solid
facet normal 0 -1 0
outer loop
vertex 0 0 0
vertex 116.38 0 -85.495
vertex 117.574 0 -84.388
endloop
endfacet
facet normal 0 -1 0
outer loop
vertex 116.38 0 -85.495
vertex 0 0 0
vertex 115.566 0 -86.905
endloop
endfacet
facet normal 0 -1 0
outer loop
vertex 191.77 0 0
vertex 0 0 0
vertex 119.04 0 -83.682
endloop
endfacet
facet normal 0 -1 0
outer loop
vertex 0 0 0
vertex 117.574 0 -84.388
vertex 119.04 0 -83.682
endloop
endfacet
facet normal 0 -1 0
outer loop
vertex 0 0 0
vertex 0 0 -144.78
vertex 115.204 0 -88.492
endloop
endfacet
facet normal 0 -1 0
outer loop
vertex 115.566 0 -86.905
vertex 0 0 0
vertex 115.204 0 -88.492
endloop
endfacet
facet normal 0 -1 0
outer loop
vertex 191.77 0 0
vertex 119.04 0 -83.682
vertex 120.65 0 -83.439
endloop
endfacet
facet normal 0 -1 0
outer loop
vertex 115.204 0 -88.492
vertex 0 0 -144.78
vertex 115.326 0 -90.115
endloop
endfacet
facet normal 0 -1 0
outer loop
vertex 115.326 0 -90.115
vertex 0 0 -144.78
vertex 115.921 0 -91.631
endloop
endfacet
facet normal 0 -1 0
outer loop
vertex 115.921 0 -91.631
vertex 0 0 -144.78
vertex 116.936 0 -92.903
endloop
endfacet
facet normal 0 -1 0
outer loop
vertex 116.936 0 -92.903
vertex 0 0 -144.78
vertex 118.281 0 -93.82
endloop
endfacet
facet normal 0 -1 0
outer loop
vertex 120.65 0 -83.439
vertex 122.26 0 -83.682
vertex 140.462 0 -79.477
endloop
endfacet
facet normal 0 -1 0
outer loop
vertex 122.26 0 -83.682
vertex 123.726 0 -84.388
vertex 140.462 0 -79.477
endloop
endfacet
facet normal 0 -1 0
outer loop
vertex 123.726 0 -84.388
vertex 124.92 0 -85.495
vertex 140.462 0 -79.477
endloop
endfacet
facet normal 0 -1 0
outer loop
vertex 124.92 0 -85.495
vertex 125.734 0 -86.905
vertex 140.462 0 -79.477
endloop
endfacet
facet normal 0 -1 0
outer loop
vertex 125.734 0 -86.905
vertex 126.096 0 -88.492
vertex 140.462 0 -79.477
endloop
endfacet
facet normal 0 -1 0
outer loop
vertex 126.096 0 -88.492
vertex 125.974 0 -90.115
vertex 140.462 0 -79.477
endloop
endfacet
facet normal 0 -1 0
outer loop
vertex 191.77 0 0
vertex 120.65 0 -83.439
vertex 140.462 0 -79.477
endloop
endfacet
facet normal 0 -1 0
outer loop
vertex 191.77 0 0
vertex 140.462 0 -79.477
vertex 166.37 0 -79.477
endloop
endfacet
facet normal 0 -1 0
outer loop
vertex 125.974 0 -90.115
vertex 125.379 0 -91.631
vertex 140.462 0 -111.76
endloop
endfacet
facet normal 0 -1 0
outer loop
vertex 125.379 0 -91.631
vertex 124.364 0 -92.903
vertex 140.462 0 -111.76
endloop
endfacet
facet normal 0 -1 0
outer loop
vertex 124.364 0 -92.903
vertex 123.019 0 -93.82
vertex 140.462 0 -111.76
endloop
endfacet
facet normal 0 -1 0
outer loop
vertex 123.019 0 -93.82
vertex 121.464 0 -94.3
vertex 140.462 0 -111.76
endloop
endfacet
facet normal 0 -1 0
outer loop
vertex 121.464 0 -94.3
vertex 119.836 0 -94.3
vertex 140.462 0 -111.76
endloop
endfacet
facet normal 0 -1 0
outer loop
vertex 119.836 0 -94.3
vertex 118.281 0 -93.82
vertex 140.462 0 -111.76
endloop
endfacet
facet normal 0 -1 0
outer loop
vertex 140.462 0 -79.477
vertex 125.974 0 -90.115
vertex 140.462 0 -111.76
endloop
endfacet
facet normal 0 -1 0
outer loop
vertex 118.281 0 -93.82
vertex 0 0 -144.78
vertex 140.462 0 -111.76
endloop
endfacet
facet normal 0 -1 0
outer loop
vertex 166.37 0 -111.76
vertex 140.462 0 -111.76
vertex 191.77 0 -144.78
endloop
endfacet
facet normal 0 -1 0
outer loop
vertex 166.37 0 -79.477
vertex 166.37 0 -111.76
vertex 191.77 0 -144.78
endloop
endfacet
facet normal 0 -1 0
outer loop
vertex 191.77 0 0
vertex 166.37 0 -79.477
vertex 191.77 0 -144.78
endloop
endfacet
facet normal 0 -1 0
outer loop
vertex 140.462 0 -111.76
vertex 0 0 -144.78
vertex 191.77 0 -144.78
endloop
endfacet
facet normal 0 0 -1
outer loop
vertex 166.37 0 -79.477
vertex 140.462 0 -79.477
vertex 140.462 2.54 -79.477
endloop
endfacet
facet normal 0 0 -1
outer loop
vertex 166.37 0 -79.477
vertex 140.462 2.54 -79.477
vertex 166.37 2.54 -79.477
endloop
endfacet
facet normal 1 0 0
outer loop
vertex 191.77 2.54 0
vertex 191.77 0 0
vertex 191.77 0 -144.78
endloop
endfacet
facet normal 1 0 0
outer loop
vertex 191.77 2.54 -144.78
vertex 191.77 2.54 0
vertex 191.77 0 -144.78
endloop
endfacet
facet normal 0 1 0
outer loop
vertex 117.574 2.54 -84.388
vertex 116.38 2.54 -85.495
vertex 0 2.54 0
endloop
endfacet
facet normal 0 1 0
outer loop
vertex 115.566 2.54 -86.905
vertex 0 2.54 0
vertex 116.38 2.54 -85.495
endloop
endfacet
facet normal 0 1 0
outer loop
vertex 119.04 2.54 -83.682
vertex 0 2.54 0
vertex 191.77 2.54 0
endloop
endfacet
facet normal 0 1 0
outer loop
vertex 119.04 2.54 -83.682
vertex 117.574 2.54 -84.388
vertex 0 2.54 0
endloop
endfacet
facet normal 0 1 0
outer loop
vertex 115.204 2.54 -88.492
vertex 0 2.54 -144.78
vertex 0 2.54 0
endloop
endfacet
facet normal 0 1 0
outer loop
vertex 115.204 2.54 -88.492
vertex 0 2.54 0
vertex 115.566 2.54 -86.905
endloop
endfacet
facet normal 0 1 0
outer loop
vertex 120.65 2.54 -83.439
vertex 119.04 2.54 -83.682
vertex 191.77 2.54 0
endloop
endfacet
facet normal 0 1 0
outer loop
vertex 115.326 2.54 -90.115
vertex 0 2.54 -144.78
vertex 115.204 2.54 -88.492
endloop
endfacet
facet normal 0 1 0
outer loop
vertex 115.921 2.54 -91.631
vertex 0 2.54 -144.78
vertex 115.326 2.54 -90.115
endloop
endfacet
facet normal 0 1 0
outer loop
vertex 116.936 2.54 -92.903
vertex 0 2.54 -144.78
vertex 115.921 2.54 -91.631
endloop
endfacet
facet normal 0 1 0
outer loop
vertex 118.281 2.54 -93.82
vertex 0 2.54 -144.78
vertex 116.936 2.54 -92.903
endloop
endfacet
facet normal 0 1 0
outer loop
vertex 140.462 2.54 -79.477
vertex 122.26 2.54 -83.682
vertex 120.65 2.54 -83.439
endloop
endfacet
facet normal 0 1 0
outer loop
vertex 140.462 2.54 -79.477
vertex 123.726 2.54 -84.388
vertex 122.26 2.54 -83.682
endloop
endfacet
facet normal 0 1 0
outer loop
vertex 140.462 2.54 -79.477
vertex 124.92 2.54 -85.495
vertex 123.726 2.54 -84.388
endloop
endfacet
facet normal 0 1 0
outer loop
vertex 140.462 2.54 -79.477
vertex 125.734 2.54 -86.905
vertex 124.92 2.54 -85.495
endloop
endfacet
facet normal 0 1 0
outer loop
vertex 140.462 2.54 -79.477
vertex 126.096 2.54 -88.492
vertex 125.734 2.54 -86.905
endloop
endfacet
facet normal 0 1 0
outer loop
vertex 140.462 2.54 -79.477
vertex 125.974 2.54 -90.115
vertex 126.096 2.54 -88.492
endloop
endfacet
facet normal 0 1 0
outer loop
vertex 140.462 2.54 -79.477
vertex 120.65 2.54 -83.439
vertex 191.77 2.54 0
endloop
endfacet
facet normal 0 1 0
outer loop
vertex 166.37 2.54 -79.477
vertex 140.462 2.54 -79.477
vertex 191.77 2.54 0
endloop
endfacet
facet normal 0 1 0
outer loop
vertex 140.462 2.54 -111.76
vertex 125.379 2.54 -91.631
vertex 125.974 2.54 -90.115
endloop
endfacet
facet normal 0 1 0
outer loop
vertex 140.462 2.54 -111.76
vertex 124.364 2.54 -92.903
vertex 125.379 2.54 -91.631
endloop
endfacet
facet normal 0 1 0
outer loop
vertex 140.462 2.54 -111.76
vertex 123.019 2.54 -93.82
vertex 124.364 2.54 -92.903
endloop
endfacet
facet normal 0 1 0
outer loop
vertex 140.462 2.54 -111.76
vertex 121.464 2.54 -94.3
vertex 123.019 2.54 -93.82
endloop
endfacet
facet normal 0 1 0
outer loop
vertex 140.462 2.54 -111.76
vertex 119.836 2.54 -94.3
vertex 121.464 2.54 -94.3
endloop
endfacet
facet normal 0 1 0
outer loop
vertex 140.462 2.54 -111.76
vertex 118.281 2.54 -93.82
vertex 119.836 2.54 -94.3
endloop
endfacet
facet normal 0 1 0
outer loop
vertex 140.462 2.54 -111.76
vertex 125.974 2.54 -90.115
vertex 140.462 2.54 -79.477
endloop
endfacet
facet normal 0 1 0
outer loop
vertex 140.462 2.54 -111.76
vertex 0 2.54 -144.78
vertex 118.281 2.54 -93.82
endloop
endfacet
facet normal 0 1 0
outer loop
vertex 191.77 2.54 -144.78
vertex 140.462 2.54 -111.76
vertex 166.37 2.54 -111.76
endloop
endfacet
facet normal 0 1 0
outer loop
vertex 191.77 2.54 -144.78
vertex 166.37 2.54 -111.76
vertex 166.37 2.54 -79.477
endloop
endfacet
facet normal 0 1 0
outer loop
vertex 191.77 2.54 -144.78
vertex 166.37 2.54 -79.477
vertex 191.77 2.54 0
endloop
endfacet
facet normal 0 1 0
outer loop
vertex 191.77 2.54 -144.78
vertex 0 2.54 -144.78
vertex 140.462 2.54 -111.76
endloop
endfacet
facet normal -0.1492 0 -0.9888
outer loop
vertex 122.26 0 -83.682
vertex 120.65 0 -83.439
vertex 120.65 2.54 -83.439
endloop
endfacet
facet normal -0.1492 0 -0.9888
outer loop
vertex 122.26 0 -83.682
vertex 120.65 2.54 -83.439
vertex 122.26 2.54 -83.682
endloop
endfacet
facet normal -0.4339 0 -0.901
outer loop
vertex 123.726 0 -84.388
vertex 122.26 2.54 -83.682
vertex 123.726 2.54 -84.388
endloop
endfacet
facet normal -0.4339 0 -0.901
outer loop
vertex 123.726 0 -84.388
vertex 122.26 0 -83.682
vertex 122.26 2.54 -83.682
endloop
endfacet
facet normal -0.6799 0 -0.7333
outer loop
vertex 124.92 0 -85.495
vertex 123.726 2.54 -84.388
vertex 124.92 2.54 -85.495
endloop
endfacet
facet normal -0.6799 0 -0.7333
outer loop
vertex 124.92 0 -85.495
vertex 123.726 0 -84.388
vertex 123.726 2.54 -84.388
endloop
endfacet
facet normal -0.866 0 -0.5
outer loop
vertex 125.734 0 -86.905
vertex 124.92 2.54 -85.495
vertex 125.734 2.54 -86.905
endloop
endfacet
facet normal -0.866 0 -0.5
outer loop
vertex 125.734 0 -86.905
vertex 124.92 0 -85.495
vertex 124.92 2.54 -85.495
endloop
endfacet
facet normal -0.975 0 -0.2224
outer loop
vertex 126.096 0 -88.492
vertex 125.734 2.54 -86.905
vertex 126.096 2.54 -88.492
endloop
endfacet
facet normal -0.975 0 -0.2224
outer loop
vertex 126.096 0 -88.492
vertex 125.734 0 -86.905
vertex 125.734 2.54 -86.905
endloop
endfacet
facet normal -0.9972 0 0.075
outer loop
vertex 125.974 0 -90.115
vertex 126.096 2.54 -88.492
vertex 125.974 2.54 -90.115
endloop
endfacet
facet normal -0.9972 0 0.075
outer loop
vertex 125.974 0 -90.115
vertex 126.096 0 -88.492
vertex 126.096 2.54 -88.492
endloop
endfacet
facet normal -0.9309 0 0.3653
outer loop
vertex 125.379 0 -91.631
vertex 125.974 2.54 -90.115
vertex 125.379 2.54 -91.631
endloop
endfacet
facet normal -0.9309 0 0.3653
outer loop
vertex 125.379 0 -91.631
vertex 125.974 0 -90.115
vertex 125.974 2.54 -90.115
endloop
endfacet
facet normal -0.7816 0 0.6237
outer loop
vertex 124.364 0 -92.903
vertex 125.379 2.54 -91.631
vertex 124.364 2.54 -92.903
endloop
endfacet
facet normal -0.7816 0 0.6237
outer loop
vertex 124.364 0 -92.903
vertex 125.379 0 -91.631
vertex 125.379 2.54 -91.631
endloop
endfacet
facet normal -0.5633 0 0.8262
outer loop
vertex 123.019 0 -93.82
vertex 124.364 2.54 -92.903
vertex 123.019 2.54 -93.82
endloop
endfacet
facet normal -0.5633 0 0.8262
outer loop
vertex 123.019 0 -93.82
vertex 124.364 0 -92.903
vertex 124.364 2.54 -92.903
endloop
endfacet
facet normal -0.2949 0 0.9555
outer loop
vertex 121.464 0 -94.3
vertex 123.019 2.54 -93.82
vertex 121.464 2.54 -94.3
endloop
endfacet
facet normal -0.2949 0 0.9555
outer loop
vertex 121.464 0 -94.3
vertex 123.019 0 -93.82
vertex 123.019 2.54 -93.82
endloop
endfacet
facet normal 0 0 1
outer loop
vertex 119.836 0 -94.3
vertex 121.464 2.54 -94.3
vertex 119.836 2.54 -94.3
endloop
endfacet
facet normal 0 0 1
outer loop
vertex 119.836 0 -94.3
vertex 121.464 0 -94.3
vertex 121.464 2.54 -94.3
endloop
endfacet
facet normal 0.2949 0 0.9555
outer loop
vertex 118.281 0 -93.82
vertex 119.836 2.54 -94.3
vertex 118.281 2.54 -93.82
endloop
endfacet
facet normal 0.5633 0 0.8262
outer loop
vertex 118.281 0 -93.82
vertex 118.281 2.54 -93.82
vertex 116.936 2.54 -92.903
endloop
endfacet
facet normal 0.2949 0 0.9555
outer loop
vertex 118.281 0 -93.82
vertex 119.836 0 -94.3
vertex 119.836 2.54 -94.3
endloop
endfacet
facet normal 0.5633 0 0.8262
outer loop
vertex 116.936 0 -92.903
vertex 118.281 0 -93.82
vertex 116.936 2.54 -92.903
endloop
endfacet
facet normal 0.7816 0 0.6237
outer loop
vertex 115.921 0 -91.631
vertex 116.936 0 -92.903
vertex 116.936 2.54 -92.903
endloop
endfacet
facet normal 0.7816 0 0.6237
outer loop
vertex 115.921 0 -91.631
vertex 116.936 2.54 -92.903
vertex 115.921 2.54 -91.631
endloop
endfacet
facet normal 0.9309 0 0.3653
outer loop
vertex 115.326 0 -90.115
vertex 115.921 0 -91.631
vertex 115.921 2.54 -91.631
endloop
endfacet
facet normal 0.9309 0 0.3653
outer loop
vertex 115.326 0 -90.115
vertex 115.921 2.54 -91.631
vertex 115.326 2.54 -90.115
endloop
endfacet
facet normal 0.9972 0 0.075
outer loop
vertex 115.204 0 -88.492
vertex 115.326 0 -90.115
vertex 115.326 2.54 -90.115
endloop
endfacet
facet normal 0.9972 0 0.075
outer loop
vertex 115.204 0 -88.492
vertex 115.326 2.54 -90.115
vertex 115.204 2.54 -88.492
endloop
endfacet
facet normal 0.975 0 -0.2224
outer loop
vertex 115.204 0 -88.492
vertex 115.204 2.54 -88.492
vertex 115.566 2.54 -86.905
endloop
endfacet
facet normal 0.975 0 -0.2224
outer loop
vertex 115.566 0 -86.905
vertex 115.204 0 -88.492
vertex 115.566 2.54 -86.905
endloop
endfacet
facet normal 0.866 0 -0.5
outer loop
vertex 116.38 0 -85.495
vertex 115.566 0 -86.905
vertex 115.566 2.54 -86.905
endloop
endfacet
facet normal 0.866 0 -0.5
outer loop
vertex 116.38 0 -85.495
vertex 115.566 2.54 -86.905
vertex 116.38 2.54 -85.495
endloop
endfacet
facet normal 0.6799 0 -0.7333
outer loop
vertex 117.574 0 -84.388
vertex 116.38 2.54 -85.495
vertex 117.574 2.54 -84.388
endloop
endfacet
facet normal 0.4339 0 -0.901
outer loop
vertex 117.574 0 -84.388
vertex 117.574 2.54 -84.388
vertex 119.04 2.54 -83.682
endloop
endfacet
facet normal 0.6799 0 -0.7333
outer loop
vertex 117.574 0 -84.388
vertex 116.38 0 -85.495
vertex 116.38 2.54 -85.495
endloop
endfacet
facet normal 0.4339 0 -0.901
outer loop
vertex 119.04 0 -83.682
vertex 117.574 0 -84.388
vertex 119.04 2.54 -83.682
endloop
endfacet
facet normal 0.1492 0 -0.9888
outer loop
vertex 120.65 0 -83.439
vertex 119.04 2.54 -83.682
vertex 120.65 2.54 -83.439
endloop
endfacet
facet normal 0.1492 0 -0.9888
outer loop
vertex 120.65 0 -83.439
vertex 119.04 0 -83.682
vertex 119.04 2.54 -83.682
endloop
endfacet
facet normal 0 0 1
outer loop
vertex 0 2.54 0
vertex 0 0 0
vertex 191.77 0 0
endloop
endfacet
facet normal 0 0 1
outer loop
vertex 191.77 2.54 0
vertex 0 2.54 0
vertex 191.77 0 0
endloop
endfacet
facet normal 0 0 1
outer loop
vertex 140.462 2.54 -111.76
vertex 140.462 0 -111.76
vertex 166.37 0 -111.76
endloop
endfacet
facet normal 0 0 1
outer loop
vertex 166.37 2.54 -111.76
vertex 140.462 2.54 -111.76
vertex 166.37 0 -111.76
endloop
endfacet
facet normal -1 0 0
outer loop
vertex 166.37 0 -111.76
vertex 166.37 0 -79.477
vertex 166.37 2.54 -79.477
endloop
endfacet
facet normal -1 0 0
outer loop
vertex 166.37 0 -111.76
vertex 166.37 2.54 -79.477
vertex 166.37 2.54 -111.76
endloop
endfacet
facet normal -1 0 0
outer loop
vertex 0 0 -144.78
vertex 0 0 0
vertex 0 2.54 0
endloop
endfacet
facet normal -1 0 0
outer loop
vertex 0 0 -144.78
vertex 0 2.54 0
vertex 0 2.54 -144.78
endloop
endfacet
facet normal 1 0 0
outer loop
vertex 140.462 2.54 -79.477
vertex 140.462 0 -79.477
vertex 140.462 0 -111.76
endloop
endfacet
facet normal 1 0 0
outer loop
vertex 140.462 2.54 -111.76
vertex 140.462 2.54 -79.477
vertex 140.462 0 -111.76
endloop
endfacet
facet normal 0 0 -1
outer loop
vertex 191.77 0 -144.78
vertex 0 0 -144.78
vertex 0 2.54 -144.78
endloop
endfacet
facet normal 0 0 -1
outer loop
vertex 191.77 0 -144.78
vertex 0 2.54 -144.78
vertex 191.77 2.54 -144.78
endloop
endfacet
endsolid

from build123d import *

# Parameters (mm, degrees)
SKETCH1_W           = 191.77
SKETCH1_H           = 144.78
SKETCH1_R           = 5.461
SKETCH1_W_2         = 25.908
SKETCH1_H_2         = 32.2834
BOSS_EXTRUDE1_DEPTH = 2.54


with BuildPart() as part:
    # Sketch1 → Boss-Extrude1 (new body)
    with BuildSketch(Plane(origin=(0, 0, 0), x_dir=(1, 0, 0), z_dir=(0, 1, 0))):
        with Locations((95.885, 72.39)):
            Rectangle(SKETCH1_W, SKETCH1_H)
        with Locations(Location((120.65, 88.9, 0), (0, 0, 270))):  # turned: the seam where the file's is
            Circle(SKETCH1_R, mode=Mode.SUBTRACT)
        with Locations((153.416, 95.6183)):
            Rectangle(SKETCH1_W_2, SKETCH1_H_2, mode=Mode.SUBTRACT)
    extrude(amount=BOSS_EXTRUDE1_DEPTH)


solid = part.part
